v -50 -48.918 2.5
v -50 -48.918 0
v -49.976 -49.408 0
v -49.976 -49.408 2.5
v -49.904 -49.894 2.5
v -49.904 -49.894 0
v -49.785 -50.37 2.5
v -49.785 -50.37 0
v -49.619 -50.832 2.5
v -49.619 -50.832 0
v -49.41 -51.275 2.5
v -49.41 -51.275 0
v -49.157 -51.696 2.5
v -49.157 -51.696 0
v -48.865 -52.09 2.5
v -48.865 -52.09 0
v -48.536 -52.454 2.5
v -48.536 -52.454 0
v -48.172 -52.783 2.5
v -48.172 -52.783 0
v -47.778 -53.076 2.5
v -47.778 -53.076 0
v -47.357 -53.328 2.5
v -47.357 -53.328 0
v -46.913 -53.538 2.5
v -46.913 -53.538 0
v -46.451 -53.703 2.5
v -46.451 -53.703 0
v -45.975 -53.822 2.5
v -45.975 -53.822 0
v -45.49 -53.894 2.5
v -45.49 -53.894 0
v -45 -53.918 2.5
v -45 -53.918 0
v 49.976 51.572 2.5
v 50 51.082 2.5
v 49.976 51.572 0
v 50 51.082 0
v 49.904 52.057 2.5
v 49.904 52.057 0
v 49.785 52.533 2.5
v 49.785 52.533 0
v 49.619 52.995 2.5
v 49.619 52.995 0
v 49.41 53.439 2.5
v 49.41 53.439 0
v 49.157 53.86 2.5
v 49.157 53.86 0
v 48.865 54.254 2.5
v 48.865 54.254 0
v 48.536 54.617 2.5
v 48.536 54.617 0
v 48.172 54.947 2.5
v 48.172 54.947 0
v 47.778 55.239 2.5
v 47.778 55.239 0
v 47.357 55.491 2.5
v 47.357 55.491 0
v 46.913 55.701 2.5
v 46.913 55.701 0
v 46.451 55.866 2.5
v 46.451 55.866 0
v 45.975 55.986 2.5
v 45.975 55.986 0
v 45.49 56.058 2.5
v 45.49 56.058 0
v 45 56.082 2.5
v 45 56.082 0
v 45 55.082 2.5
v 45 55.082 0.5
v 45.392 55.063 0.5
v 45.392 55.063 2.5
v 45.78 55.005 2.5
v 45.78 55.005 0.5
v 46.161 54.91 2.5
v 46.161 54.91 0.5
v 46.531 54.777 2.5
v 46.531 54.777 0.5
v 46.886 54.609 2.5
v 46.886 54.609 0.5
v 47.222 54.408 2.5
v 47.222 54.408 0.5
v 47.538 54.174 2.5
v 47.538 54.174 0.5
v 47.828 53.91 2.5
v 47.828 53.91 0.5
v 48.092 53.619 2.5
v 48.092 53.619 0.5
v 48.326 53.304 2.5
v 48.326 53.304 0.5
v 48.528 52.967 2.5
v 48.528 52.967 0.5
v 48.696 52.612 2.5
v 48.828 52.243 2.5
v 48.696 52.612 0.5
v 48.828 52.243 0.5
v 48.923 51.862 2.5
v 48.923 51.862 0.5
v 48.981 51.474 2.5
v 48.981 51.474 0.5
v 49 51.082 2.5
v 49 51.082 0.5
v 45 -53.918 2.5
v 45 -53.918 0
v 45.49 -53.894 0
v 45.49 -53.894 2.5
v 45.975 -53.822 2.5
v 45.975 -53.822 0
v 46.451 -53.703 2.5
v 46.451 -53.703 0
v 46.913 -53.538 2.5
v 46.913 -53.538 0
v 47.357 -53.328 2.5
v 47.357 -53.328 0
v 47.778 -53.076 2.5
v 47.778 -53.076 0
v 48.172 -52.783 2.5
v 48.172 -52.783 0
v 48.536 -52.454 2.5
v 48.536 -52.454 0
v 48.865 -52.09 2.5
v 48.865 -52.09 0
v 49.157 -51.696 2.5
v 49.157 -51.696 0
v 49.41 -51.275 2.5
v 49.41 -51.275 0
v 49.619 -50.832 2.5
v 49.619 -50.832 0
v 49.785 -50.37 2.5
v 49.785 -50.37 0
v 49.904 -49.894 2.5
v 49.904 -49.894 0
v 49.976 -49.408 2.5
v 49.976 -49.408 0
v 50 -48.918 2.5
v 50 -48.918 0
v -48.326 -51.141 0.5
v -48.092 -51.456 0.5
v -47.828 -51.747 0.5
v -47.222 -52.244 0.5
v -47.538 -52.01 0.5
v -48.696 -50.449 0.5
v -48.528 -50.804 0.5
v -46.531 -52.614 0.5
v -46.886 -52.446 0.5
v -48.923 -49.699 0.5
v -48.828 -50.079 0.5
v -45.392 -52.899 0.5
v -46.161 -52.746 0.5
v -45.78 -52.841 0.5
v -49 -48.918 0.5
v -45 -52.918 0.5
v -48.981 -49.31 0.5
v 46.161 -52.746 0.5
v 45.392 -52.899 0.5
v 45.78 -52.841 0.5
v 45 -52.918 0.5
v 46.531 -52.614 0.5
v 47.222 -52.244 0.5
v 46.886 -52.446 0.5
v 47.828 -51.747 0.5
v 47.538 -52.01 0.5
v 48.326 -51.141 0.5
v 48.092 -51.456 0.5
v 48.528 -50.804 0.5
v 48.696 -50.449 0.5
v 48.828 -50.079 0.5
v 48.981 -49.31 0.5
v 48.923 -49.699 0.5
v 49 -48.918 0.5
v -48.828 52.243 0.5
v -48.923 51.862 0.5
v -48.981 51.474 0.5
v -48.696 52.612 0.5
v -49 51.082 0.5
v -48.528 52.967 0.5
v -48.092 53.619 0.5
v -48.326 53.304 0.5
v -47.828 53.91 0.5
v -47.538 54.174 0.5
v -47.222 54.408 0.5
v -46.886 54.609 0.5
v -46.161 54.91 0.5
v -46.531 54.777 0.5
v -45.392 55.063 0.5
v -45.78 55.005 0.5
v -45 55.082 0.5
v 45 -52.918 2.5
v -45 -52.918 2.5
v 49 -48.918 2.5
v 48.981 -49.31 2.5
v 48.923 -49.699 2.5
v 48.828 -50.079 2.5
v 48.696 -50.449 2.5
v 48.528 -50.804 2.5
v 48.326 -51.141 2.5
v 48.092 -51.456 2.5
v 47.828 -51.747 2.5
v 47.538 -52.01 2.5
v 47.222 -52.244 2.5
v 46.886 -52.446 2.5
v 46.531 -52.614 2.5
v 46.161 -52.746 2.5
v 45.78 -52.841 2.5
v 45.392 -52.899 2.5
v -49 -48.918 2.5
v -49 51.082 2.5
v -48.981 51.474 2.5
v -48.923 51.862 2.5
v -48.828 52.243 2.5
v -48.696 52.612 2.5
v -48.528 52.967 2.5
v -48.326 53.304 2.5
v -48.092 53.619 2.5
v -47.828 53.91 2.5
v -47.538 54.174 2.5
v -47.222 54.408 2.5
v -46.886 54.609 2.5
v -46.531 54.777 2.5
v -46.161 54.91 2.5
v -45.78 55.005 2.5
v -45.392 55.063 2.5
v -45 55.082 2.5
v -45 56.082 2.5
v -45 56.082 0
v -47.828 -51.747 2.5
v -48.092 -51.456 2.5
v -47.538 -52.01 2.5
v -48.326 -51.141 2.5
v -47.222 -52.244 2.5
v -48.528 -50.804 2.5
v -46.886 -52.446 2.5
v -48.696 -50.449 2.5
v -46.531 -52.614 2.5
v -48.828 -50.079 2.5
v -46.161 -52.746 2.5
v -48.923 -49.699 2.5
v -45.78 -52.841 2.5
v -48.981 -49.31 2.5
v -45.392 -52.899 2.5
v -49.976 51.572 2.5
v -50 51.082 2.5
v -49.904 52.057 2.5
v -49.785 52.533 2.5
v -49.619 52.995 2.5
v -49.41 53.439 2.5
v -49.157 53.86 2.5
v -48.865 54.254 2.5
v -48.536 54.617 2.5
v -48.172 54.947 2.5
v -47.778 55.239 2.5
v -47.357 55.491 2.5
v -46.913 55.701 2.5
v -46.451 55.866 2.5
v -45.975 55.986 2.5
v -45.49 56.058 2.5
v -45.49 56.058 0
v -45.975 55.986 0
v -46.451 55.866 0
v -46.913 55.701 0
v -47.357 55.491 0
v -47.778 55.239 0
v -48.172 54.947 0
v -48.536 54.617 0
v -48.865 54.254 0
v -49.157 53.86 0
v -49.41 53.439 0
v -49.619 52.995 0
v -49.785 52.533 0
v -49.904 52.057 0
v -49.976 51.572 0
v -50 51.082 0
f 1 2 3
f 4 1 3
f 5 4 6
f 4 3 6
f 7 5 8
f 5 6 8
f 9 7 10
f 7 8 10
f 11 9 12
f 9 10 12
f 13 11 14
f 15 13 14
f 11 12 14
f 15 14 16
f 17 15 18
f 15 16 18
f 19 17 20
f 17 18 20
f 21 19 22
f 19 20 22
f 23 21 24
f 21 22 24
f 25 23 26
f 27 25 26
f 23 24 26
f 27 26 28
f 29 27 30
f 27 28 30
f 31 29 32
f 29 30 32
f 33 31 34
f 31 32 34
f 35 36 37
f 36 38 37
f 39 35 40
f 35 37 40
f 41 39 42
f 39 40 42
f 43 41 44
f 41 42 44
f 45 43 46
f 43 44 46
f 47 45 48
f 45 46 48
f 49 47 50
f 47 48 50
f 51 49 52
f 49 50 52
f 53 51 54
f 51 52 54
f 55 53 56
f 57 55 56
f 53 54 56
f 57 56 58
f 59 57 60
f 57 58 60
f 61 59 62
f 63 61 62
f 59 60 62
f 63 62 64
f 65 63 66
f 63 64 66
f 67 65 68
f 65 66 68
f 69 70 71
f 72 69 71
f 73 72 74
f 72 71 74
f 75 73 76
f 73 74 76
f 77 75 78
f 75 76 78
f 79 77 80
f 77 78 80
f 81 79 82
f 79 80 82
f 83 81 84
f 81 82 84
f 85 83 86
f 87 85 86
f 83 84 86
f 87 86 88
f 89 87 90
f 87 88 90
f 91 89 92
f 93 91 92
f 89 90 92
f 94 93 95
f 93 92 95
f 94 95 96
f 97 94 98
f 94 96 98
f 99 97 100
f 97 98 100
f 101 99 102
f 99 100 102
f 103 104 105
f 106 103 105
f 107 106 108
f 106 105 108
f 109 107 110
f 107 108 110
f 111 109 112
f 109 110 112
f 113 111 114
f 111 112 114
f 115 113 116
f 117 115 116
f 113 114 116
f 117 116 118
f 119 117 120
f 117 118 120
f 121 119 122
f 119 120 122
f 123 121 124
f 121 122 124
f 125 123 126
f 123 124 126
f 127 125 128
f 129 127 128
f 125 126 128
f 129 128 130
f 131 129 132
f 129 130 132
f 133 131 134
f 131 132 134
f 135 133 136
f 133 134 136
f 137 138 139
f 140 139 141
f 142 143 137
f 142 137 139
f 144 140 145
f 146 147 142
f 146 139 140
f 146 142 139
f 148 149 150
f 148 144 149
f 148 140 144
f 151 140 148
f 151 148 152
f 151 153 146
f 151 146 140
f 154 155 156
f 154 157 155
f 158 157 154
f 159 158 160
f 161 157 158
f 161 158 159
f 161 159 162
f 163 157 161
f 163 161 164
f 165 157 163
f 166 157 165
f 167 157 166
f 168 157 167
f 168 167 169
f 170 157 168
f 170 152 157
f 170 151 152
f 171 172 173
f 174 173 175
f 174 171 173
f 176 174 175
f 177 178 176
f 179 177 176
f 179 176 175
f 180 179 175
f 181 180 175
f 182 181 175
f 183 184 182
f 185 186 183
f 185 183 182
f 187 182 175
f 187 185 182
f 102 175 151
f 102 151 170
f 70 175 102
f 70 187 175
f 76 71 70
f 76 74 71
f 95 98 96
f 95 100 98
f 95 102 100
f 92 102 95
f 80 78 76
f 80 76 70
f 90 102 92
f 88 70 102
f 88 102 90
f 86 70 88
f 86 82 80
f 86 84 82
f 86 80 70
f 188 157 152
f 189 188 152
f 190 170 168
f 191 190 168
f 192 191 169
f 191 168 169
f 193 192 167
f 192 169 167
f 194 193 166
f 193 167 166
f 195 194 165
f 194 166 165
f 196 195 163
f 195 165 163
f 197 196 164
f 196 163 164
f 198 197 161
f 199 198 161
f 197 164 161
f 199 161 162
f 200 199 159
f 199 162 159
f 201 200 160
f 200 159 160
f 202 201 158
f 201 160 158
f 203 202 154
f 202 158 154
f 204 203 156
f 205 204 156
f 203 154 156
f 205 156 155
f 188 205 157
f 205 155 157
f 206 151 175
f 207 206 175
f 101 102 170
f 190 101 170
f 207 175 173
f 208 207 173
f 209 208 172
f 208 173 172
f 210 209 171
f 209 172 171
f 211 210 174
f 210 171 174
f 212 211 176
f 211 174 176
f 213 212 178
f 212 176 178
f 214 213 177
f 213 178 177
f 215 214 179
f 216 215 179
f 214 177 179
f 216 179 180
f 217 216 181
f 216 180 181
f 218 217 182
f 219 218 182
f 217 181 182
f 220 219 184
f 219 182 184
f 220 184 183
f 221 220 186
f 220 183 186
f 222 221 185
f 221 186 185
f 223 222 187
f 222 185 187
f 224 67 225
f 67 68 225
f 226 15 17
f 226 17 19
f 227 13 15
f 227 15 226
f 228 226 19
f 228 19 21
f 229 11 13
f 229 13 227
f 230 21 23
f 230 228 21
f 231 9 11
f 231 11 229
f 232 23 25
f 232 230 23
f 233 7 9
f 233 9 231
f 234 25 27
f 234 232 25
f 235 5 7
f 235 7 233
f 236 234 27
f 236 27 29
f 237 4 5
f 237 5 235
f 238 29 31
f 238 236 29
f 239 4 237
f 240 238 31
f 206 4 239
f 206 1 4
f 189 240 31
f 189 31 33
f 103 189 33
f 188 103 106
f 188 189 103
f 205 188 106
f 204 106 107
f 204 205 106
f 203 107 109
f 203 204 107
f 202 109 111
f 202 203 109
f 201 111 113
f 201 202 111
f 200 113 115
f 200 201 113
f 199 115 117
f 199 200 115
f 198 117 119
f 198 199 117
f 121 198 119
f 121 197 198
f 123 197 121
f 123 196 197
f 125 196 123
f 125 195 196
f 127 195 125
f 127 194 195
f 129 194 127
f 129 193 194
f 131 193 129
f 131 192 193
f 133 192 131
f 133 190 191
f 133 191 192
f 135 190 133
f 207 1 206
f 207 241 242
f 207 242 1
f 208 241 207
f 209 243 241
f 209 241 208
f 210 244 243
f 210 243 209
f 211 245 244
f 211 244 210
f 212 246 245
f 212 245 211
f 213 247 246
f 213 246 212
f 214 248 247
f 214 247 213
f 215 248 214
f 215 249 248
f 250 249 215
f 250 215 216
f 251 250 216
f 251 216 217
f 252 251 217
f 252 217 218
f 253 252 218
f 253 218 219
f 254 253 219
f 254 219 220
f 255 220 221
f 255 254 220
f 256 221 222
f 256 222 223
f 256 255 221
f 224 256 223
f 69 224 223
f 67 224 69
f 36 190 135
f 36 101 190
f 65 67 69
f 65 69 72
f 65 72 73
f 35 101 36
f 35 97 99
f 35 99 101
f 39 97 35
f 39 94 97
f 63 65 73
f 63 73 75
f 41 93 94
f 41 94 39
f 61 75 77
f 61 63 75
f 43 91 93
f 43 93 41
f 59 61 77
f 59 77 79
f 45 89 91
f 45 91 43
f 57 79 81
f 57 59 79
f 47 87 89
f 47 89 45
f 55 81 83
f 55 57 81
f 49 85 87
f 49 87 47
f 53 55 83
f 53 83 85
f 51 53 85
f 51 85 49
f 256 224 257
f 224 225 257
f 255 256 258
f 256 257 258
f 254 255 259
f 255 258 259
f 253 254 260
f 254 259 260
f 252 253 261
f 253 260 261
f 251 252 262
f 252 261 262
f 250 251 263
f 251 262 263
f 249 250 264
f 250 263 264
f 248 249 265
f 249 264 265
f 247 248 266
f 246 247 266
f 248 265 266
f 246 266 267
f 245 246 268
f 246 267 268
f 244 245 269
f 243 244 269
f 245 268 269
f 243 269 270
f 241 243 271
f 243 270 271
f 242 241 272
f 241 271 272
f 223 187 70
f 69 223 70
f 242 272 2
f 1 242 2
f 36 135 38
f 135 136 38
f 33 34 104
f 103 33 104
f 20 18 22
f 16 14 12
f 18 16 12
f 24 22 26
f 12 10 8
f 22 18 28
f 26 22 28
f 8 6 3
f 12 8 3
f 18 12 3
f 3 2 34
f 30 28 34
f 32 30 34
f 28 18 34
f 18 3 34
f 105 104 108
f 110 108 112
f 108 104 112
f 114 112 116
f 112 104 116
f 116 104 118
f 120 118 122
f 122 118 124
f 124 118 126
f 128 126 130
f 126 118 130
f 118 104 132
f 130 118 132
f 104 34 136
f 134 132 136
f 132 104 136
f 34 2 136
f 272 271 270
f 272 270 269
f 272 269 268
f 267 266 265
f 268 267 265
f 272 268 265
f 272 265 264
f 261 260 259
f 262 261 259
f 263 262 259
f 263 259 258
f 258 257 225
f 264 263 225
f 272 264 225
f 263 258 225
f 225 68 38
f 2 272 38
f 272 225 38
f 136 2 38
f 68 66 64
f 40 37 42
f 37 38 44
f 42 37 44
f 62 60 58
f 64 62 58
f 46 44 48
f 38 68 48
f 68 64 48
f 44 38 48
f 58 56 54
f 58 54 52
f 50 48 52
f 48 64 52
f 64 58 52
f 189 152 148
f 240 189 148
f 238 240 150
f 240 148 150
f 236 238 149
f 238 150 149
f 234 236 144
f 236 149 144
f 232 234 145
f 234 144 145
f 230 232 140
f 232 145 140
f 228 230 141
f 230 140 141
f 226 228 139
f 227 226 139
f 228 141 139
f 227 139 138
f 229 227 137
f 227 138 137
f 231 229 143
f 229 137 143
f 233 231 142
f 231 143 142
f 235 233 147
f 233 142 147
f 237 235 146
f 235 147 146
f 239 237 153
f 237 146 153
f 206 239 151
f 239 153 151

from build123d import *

# Parameters (mm, degrees)
F1_DEPTH = 0.5
F3_DEPTH = 2


with BuildPart() as f1:
    # F0 (on Top) → F1 (new body)
    with BuildSketch(Plane.XY):
        with BuildLine():
            Line((-45, -53.918237), (45, -53.918237))
            ThreePointArc((45, -53.918237), (48.535534, -52.453771), (50, -48.918237))
            Line((50, -48.918237), (50, 51.081763))
            ThreePointArc((50, 51.081763), (48.535534, 54.617297), (45, 56.081763))
            Line((45, 56.081763), (-45, 56.081763))
            ThreePointArc((-45, 56.081763), (-48.535534, 54.617297), (-50, 51.081763))
            Line((-50, 51.081763), (-50, -48.918237))
            ThreePointArc((-50, -48.918237), (-48.535534, -52.453771), (-45, -53.918237))
        make_face()
    extrude(amount=F1_DEPTH)

    # F2 (on face) → F3 (join)
    with BuildSketch(Plane.XY.offset(0.5)):
        with BuildLine():
            ThreePointArc((45, -53.918237), (48.535534, -52.453771), (50, -48.918237))
            Line((50, -48.918237), (50, 51.081763))
            ThreePointArc((50, 51.081763), (48.535534, 54.617297), (45, 56.081763))
            Line((45, 56.081763), (-45, 56.081763))
            ThreePointArc((-45, 56.081763), (-48.535534, 54.617297), (-50, 51.081763))
            Line((-50, 51.081763), (-50, -48.918237))
            ThreePointArc((-50, -48.918237), (-48.535534, -52.453771), (-45, -53.918237))
            Line((-45, -53.918237), (45, -53.918237))
        make_face()
        with BuildLine():
            Line((49, 51.081763), (49, -48.918237))
            ThreePointArc((49, -48.918237), (47.828427, -51.746664), (45, -52.918237))
            Line((45, -52.918237), (-45, -52.918237))
            ThreePointArc((-45, -52.918237), (-47.828427, -51.746664), (-49, -48.918237))
            Line((-49, -48.918237), (-49, 51.081763))
            ThreePointArc((-49, 51.081763), (-47.828427, 53.91019), (-45, 55.081763))
            Line((-45, 55.081763), (45, 55.081763))
            ThreePointArc((45, 55.081763), (47.828427, 53.91019), (49, 51.081763))
        make_face(mode=Mode.SUBTRACT)
    extrude(amount=F3_DEPTH)


solid = f1.part
